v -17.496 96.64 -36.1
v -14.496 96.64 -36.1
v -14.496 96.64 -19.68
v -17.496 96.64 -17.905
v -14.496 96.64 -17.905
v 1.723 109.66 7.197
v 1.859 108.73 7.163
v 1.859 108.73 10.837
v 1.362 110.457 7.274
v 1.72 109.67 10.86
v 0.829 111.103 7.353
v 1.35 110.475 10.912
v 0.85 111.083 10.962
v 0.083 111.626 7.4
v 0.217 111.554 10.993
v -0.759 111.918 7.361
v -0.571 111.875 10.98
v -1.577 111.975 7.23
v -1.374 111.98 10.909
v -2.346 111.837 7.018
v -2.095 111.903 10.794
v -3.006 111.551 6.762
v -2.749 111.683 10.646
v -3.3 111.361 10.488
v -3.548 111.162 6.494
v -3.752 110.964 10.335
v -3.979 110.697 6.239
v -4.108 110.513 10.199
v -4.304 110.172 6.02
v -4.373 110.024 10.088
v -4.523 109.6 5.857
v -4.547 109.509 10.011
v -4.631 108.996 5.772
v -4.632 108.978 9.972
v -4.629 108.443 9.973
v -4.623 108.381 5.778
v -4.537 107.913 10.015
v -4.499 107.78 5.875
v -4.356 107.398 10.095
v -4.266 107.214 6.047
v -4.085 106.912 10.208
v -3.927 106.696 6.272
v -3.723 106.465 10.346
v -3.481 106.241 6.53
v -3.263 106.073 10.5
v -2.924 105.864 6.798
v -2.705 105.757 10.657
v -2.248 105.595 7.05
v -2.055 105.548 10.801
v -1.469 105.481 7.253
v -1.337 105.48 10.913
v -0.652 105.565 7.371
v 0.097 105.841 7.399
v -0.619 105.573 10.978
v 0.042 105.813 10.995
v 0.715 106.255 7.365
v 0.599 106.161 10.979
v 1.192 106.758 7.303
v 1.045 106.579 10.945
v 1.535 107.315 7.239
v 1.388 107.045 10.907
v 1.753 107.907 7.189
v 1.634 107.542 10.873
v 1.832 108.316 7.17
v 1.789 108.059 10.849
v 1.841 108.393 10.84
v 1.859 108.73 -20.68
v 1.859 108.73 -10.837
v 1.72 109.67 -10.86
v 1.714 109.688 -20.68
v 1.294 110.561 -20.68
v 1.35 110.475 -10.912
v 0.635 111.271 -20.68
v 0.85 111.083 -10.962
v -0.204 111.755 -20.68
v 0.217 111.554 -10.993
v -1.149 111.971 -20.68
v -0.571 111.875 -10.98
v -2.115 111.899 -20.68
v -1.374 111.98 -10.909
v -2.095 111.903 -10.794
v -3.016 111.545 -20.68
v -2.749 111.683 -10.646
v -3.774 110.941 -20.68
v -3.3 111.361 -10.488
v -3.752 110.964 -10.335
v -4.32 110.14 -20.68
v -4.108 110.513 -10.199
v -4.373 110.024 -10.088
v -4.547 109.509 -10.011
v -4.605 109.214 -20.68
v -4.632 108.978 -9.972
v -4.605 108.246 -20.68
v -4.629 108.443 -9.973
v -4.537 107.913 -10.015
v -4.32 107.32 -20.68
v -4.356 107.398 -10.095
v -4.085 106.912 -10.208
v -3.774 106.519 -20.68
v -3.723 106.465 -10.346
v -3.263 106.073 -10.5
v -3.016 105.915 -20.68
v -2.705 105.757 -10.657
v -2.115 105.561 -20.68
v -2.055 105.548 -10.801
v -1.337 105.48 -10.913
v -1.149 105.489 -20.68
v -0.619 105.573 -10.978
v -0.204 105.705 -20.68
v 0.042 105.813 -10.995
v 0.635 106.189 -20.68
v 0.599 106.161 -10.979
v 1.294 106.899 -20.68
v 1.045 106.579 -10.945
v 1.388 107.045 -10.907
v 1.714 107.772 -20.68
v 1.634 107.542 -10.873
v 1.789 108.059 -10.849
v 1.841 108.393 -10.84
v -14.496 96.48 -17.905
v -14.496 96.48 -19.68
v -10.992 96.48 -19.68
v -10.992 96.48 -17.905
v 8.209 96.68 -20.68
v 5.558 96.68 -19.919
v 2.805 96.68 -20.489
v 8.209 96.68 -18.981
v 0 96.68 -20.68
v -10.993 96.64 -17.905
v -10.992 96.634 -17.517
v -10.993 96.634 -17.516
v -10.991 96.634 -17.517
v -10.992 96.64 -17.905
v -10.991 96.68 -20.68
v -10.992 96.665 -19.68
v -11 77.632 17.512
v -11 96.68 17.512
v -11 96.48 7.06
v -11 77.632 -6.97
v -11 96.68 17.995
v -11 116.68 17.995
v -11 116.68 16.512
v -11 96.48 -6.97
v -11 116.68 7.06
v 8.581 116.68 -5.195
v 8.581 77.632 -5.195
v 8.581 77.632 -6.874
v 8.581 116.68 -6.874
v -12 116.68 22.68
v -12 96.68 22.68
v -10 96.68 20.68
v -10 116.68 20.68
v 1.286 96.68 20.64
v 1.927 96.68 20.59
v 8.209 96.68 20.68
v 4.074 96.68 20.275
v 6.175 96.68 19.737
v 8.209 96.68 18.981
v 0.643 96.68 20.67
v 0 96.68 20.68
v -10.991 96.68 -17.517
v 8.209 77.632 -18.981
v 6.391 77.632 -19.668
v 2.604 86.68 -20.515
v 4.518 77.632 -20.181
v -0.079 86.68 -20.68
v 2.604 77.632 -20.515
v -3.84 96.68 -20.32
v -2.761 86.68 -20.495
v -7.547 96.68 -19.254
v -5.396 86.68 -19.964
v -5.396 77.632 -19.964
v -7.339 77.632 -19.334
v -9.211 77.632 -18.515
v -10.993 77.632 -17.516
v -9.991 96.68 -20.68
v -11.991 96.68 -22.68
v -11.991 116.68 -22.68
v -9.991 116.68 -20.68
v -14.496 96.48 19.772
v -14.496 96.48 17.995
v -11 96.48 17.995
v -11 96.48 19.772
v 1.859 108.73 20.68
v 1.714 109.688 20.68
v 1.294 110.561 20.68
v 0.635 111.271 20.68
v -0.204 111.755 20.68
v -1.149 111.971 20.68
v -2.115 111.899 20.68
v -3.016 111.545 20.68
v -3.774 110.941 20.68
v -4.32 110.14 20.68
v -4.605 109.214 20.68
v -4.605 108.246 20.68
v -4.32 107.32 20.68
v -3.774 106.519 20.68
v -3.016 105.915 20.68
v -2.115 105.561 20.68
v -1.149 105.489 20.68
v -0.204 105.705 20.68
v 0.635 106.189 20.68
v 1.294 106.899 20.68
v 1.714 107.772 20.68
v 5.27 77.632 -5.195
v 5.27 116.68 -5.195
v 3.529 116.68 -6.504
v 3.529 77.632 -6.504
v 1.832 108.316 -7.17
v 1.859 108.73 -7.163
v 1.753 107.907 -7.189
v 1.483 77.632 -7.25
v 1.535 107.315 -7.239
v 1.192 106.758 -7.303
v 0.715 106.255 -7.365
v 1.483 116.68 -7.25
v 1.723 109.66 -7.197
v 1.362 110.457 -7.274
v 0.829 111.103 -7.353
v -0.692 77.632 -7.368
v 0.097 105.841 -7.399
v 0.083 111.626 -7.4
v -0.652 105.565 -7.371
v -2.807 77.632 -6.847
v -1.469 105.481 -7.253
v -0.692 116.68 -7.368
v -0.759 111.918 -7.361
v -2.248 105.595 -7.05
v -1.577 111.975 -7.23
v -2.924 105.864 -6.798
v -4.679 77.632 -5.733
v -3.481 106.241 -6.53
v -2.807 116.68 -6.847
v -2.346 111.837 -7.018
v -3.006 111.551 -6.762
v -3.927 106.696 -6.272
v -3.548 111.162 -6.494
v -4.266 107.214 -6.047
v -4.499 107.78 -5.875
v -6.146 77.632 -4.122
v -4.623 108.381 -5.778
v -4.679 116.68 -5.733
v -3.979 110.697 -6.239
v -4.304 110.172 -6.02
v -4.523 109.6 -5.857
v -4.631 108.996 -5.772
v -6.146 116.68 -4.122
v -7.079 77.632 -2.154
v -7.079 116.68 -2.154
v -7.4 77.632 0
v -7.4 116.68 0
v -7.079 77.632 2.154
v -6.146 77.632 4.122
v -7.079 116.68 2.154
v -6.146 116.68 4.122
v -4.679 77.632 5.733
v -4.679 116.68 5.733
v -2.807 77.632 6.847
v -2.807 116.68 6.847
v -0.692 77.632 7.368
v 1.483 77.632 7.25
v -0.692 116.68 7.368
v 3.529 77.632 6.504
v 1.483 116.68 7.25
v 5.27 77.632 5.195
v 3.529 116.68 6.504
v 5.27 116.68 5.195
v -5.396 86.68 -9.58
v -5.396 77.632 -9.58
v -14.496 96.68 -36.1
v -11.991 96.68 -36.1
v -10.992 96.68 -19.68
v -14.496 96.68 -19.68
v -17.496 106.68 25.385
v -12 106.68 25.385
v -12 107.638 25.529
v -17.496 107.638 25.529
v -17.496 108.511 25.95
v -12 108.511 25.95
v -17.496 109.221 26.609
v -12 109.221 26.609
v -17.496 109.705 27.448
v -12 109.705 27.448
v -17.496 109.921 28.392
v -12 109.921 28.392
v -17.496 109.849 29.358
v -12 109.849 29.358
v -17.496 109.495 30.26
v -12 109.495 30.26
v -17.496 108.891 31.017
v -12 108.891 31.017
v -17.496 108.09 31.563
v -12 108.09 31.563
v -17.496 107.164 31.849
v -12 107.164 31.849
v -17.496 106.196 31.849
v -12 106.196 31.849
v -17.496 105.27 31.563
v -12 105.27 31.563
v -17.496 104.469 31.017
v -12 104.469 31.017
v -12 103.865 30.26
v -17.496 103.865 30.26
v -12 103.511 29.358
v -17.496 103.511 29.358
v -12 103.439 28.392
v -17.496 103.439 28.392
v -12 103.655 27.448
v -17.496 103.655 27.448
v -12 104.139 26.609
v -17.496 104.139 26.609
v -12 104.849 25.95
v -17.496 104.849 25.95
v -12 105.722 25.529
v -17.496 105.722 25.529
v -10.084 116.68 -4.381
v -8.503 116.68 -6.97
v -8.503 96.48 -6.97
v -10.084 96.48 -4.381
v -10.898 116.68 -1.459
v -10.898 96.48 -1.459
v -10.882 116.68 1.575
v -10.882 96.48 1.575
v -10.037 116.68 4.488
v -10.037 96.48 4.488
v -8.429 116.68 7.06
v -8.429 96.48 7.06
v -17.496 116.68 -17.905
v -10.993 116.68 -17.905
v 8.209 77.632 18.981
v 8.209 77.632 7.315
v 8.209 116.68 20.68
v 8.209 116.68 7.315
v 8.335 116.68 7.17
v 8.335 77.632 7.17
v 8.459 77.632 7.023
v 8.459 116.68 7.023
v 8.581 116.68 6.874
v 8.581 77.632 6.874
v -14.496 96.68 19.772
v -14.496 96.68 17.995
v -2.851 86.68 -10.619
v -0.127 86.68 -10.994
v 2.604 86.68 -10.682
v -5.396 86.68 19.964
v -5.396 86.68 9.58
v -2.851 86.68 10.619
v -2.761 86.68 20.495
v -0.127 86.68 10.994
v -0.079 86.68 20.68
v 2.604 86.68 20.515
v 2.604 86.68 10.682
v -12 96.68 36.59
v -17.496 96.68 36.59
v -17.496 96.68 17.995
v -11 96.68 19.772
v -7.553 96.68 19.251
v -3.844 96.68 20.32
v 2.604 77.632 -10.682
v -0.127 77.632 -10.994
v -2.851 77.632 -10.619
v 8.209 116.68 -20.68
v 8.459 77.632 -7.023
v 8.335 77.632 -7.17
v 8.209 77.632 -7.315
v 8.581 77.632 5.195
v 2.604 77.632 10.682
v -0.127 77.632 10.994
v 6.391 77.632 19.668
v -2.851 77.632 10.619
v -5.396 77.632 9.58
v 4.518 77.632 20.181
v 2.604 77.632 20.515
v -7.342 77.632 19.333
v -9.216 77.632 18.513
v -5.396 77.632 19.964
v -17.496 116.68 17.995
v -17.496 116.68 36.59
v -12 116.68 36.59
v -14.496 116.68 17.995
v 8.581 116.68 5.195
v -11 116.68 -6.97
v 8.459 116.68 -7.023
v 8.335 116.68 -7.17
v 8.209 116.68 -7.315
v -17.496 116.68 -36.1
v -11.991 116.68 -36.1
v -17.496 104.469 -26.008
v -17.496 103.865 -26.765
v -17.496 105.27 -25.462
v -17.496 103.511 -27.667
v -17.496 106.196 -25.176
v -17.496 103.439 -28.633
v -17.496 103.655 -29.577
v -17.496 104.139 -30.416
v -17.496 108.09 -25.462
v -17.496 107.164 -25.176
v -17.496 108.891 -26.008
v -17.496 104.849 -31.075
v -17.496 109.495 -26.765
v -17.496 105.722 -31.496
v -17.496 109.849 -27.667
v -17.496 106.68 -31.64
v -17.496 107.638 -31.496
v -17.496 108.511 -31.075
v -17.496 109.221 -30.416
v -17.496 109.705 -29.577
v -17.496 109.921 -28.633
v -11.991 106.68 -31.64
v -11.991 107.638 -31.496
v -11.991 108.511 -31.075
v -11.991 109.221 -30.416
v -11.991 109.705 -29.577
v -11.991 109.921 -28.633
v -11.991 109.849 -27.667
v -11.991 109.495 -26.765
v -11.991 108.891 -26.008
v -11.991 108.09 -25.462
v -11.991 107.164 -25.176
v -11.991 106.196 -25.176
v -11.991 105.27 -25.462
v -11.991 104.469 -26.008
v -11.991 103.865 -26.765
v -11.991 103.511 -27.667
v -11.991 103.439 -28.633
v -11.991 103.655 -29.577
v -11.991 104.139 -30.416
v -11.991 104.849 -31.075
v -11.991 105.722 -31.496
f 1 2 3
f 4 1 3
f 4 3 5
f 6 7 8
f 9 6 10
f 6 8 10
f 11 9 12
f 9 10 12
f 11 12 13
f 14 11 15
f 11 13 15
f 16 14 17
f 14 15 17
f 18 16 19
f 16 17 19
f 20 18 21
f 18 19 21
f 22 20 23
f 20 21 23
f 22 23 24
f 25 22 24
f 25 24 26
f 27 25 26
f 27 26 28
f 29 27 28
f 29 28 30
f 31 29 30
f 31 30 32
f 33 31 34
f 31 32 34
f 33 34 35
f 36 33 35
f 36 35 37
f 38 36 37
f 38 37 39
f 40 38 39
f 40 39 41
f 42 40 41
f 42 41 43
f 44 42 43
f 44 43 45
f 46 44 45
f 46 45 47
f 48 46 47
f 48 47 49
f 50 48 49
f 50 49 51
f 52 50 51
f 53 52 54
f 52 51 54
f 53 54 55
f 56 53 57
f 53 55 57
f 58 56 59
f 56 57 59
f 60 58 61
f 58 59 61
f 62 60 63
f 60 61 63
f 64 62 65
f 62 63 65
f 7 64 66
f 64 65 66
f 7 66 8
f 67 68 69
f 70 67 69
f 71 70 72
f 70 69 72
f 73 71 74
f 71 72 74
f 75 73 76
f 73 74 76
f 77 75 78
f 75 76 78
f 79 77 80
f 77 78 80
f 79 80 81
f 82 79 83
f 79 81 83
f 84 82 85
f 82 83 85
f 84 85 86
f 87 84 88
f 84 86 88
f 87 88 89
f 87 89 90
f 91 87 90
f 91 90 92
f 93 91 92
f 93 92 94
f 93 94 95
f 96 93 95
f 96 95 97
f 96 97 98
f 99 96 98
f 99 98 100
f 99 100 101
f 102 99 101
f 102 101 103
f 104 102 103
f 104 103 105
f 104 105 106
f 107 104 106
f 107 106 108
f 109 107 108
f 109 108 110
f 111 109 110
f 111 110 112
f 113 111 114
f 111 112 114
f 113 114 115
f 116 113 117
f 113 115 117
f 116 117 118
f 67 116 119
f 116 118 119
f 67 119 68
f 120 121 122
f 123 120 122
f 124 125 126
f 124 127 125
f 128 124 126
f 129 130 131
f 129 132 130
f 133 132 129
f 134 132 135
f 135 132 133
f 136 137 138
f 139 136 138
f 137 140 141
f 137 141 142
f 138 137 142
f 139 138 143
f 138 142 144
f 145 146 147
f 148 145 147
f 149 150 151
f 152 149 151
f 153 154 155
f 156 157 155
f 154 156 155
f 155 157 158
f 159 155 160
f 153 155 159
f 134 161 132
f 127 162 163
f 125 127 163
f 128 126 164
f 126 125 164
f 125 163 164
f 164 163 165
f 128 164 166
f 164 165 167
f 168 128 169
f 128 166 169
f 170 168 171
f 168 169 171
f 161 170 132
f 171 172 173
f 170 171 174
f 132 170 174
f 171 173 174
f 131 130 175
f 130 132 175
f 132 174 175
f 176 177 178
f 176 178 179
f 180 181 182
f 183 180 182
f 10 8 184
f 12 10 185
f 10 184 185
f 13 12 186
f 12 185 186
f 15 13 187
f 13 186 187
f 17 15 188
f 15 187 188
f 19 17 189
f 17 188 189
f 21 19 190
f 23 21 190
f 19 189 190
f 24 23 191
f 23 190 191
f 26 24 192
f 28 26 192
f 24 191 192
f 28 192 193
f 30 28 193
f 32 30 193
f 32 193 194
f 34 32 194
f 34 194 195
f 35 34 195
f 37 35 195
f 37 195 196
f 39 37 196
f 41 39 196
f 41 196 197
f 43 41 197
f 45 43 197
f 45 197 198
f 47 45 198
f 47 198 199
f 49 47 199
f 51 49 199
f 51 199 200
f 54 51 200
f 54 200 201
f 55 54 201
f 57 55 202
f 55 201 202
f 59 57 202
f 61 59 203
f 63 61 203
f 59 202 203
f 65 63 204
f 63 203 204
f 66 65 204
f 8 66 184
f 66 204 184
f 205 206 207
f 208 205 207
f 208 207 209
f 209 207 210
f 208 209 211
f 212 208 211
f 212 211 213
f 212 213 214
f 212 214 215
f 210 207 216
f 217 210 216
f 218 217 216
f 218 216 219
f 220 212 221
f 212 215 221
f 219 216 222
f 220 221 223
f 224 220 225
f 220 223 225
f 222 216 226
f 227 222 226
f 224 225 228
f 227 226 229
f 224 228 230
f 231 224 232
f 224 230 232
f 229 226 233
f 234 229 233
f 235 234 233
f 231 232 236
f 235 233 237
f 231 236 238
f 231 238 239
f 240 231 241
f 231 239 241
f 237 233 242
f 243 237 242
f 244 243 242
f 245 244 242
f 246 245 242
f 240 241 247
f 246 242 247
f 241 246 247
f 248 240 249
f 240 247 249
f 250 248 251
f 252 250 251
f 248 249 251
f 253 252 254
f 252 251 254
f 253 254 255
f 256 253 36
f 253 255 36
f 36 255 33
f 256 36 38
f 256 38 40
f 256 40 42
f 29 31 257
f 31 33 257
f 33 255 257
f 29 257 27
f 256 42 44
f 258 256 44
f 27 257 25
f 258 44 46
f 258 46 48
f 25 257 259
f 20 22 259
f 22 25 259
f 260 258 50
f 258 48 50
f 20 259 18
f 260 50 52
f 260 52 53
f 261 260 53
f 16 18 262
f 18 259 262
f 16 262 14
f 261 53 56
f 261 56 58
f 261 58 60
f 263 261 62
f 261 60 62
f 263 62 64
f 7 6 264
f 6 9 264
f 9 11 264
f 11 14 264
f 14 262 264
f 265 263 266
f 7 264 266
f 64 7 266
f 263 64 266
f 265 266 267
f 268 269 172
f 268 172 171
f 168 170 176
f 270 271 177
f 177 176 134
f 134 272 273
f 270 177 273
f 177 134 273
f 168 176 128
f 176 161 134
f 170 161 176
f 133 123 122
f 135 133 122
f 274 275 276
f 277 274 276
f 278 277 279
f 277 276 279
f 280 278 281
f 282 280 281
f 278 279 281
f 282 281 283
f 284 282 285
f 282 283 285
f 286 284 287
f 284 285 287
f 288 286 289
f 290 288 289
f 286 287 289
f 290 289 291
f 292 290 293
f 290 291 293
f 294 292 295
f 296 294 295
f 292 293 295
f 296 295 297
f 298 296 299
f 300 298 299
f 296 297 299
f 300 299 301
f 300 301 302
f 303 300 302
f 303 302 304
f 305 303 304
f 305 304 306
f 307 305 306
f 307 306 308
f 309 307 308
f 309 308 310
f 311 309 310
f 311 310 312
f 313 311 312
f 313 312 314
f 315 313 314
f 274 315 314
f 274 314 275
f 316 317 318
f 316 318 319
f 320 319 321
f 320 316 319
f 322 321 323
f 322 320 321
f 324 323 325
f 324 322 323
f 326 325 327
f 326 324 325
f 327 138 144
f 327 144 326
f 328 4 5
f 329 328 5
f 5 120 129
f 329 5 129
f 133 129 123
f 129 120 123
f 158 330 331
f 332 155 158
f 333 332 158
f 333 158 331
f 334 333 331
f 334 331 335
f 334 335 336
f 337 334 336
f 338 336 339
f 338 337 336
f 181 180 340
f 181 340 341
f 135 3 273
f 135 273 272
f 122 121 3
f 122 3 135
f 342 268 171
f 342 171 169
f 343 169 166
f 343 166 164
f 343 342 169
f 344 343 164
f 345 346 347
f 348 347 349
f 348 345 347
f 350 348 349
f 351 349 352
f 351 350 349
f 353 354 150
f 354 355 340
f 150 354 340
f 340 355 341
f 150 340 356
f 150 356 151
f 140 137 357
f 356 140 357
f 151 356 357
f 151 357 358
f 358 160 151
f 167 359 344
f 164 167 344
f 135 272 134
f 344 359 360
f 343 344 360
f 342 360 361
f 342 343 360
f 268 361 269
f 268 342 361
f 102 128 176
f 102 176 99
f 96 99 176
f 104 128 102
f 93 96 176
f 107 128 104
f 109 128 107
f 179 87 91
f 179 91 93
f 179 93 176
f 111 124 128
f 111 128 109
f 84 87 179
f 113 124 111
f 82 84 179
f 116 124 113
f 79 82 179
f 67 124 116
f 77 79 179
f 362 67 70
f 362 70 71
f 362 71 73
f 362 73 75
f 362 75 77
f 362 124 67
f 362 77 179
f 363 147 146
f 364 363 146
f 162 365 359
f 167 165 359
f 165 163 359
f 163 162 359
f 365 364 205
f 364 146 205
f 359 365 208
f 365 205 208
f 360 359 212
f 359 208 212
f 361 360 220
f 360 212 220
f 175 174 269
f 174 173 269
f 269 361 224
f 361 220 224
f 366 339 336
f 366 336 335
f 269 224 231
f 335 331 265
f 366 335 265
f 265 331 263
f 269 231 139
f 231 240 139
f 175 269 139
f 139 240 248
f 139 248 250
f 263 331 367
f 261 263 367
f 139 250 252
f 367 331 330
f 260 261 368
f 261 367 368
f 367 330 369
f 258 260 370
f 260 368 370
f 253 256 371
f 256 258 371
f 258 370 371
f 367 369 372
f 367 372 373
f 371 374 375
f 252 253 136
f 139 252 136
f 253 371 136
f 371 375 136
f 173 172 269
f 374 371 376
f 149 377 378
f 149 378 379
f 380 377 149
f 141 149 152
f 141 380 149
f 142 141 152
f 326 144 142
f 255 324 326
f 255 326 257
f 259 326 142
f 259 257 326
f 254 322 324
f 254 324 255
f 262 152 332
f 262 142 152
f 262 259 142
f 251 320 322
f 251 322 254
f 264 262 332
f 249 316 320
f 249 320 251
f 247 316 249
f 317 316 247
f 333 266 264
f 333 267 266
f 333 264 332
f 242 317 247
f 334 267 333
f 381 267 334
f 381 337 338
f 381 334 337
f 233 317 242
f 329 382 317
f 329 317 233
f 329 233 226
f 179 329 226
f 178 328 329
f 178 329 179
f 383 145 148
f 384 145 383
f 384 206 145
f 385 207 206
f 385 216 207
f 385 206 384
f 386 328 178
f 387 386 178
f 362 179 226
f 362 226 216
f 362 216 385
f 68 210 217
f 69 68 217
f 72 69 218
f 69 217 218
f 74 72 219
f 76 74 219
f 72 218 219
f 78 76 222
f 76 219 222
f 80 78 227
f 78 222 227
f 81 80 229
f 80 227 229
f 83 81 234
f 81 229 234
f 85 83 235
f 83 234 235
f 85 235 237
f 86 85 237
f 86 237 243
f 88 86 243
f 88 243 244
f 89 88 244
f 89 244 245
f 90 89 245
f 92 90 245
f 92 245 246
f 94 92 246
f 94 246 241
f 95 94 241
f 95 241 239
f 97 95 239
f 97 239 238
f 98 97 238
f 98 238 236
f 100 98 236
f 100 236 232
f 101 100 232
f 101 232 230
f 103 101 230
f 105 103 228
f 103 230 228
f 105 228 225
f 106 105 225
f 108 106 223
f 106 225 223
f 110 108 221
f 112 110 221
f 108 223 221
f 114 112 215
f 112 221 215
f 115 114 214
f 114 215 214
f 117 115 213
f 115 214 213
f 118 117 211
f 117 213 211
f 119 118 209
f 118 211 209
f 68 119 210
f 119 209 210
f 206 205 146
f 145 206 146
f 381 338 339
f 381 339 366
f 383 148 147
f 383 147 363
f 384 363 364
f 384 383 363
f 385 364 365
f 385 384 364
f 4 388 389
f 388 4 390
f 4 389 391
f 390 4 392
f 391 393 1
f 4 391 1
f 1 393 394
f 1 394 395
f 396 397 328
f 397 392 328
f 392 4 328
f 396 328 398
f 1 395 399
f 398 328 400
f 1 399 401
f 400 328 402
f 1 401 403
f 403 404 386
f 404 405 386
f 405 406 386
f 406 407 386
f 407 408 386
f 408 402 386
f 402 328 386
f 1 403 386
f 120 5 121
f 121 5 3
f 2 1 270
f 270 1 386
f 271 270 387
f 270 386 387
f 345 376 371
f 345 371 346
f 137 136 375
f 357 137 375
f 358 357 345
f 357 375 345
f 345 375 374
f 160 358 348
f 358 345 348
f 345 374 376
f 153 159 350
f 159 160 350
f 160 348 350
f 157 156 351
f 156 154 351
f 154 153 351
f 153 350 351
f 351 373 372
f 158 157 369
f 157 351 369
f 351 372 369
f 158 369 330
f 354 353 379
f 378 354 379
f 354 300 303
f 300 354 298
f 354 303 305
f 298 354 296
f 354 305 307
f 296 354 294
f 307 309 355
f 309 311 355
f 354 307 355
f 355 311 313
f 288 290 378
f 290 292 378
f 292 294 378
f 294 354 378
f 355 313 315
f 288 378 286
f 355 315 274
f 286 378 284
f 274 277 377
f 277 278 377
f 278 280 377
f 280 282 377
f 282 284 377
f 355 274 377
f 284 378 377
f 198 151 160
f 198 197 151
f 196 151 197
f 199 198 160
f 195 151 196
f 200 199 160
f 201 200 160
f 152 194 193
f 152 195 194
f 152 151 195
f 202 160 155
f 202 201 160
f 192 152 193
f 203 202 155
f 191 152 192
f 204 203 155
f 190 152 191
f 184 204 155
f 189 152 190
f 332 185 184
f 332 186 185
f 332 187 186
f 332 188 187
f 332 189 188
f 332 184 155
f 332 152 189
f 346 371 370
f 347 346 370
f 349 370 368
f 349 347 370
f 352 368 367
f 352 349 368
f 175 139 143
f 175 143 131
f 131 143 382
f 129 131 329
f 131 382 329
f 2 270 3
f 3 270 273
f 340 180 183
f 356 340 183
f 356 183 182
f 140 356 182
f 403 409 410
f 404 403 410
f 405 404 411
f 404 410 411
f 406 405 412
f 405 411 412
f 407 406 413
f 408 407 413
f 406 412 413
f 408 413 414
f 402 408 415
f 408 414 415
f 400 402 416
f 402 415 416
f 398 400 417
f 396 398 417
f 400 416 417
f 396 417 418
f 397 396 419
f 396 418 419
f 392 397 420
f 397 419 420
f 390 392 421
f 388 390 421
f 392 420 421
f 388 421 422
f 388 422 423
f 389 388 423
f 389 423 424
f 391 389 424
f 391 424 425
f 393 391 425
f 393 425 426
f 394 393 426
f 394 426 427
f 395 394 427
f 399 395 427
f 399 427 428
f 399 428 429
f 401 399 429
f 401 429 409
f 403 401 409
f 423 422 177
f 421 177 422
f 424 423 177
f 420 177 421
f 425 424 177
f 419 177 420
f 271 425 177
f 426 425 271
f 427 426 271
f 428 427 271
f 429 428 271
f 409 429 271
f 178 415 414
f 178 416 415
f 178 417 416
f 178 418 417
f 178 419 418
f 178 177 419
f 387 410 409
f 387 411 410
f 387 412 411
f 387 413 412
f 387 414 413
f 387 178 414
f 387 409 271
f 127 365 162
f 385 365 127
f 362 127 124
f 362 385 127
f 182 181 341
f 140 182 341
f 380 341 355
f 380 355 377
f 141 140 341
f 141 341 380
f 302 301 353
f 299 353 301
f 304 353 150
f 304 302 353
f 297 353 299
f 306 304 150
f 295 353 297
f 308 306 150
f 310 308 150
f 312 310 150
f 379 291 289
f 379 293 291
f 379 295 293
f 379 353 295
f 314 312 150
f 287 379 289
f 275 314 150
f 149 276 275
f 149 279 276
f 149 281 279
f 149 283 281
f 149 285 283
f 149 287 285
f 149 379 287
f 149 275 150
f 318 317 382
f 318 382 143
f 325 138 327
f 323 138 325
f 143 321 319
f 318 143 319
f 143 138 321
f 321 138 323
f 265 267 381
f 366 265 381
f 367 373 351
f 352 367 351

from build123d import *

# Parameters (mm, degrees)
SKETCH_1_R                = 20.68
SKETCH_1_R_2              = 9.68
EXTRUDE_1_DEPTH           = 116.68
SKETCH_11_W               = 27
SKETCH_11_H               = 150
CUT_EXTRUDE_3_DEPTH       = 40
SKETCH_13_W               = 10
SKETCH_13_H               = 128.345013401
CUT_EXTRUDE_7_DEPTH       = 42.68
SKETCH_15_W               = 8
SKETCH_15_H               = 68.68
CUT_EXTRUDE_9_DEPTH       = 48
SKETCH_16_W               = 15.549431524
SKETCH_16_H               = 20
SKETCH_16_W_2             = 15.459431524
EXTRUDE_4_DEPTH           = 19.2
SKETCH_17_W               = 19.20851187
SKETCH_17_H               = 14.03
CUT_EXTRUDE_10_DEPTH      = 20.2
SKETCH_18_R               = 9.59
CUT_EXTRUDE_11_DEPTH      = 117.68
SKETCH_21_R               = 2.985
CUT_EXTRUDE_12_DEPTH      = 55.2
SKETCH_24_R               = 20.59
SKETCH_24_R_2             = 9.59
EXTRUDE_2_DEPTH           = 55.2
CUT_EXTRUDE_13_DEPTH      = 55.2
SKETCH_26_W               = 10.00851187
SKETCH_26_H               = 41.68
CUT_EXTRUDE_15_DEPTH      = 55.2
SKETCH_27_W               = 10
SKETCH_27_H               = 40
CUT_EXTRUDE_16_DEPTH      = 55.2
SKETCH_28_W               = 44.880694938
SKETCH_28_H               = 9.608044066
CUT_EXTRUDE_17_DEPTH      = 12.2
SKETCH_35_W               = 13.53
SKETCH_35_H               = 20
EXTRUDE_10_DEPTH          = 15
EXTRUDE_11_DEPTH          = 15
SKETCH_37_W               = 9
SKETCH_37_H               = 20
EXTRUDE_12_DEPTH          = 20
SKETCH_38_W               = 9
SKETCH_38_H               = 20
EXTRUDE_13_DEPTH          = 20
SKETCH_42_R               = 2.985
CUT_EXTRUDE_21_DEPTH      = 20
CUT_EXTRUDE_23_DEPTH      = 129.465
SKETCH_45_W               = 3
SKETCH_45_H               = 20
EXTRUDE_14_DEPTH          = 30
SKETCH_46_W               = 3
SKETCH_46_H               = 20
EXTRUDE_15_DEPTH          = 30
SKETCH_47_W               = 33.078221107
SKETCH_47_H               = 20
EXTRUDE_16_DEPTH          = 50
SKETCH_48_W               = 30
SKETCH_48_H               = 20
EXTRUDE_17_DEPTH          = 50
SKETCH_50_W               = 50
SKETCH_50_H               = 20
EXTRUDE_18_DEPTH          = 1
SKETCH_51_W               = 50
SKETCH_51_H               = 20
EXTRUDE_19_DEPTH          = 1
SKETCH_52_W               = 53
SKETCH_52_H               = 14
CUT_EXTRUDE_24_DEPTH      = 129.465
SKETCH_53_W               = 53
SKETCH_53_H               = 14
CUT_EXTRUDE_25_DEPTH      = 129.465
SKETCH_54_W               = 40
SKETCH_54_H               = 73.27
CUT_EXTRUDE_26_DEPTH      = 129.465
SKETCH_56_W               = 13.00851187
SKETCH_56_H               = 20
EXTRUDE_21_DEPTH          = 3.08
SKETCH_58_W               = 44.672014854
SKETCH_58_H               = 95.939897673
CUT_EXTRUDE_28_DEPTH      = 90.76
SKETCH_59_R               = 9.7
CUT_EXTRUDE_29_DEPTH      = 40.048276961
SKETCH_60_W               = 6.504255935
SKETCH_60_H               = 76.35
CUT_EXTRUDE_30_DEPTH      = 40.048276961
CUT_EXTRUDE_32_DEPTH      = 20
SKETCH_64_W               = 16.20851187
SKETCH_64_H               = 0.09
EXTRUDE_22_DEPTH          = 20
SKETCH_65_W               = 3.495744065
SKETCH_65_H               = 3.26
CUT_EXTRUDE_33_DEPTH      = 40.048276961
SKETCH_66_W               = 3.495744065
SKETCH_66_H               = 1.776778893
SKETCH_66_W_2             = 3.503635083
SKETCH_66_H_2             = 1.775
EXTRUDE_23_DEPTH          = 20.2
SKETCH_68_W               = 6.504255935
SKETCH_68_H               = 3.66
CUT_EXTRUDE_34_DEPTH      = 20
SKETCH_69_R               = 2.985
CUT_EXTRUDE_35_DEPTH      = 7.504255935
SKETCH_70_R               = 2.985
CUT_EXTRUDE_36_DEPTH      = 17
SKETCH_71_W               = 18.595
SKETCH_71_H               = 20
SKETCH_71_W_2             = 18.195
SKETCH_71_H_2             = 20.0404814
EXTRUDE_24_DEPTH          = 10
SKETCH_72_R               = 3.05
CUT_EXTRUDE_37_DEPTH      = 17.495744065
SKETCH_73_W               = 4
SKETCH_73_H               = 15.42
CUT_EXTRUDE_39_DEPTH      = 40.048276961
SKETCH_74_W               = 4
SKETCH_74_H               = 15.91
CUT_EXTRUDE_40_DEPTH      = 40.048276961
EXTRUDE_25_DEPTH          = 20
SKETCH_77_W               = 7
SKETCH_77_H               = 72.69
CUT_EXTRUDE_41_DEPTH      = 40.048276961
SKETCH_78_R               = 3.25
CUT_EXTRUDE_42_DEPTH      = 87.1
SKETCH_79_R               = 3.25
CUT_EXTRUDE_43_DEPTH      = 10
CUT_EXTRUDE_43_DEPTH_BACK = 10
SKETCH_80_R               = 10.995
SKETCH_80_R_2             = 6.995
EXTRUDE_3_DEPTH           = 40
CUT_EXTRUDE_44_DEPTH      = 87.1
SKETCH_82_W               = 11.494274306
SKETCH_82_H               = 10.39
CUT_EXTRUDE_45_DEPTH      = 43
SKETCH_83_R               = 3.25
CUT_EXTRUDE_46_DEPTH      = 78
SKETCH_84_W               = 4.108929189
SKETCH_84_H               = 16.904278856
CUT_EXTRUDE_47_DEPTH      = 46
SKETCH_85_R               = 7.4
CUT_EXTRUDE_48_DEPTH      = 40.048276961


with BuildPart() as part:
    # 草圖1 → 伸長-薄件1 (new body)
    with BuildSketch(Plane(origin=(0, 0, 0), x_dir=(1, 0, 0), z_dir=(0, 1, 0))):
        Circle(SKETCH_1_R)
        Circle(SKETCH_1_R_2, mode=Mode.SUBTRACT)
    extrude(amount=EXTRUDE_1_DEPTH)

    # 草圖11 → 除料-伸長3 (cut)
    with BuildSketch(Plane(origin=(0, 116.68, 0), x_dir=(1, 0, 0), z_dir=(0, 1, 0))):
        with Locations((21.70851187, -44.235815192)):
            Rectangle(SKETCH_11_W, SKETCH_11_H)
    extrude(amount=-CUT_EXTRUDE_3_DEPTH, mode=Mode.SUBTRACT)

    # 草圖13 → 除料-伸長7 (cut, through all)
    with BuildSketch(Plane.XY.offset(21)):
        with Locations((-16, 58.612182466)):
            Rectangle(SKETCH_13_W, SKETCH_13_H)
    extrude(amount=-CUT_EXTRUDE_7_DEPTH, mode=Mode.SUBTRACT)

    # 草圖15 → 除料-伸長9 (cut)
    with BuildSketch(Plane.XY.offset(21)):
        with Locations((-1.395744065, 52.34)):
            Rectangle(SKETCH_15_W, SKETCH_15_H)
    extrude(amount=-CUT_EXTRUDE_9_DEPTH, mode=Mode.SUBTRACT)

    # 草圖16 → 填料-伸長4 (add)
    with BuildSketch(Plane(origin=(8.20851187, 0, 0), x_dir=(0, 0, -1), z_dir=(1, 0, 0))):
        with Locations((12.905284238, 106.68)):
            Rectangle(SKETCH_16_W, SKETCH_16_H)
        with Locations((-12.860284238, 106.68)):
            Rectangle(SKETCH_16_W_2, SKETCH_16_H)
    extrude(amount=-EXTRUDE_4_DEPTH)

    # 草圖17 → 除料-伸長10 (cut)
    with BuildSketch(Plane(origin=(0, 116.68, 0), x_dir=(1, 0, 0), z_dir=(0, 1, 0))):
        with Locations((-1.395744065, -0.045)):
            Rectangle(SKETCH_17_W, SKETCH_17_H)
    extrude(amount=-CUT_EXTRUDE_10_DEPTH, mode=Mode.SUBTRACT)

    # 草圖18 → 除料-伸長11 (cut, through all)
    with BuildSketch(Plane.XZ):
        Circle(SKETCH_18_R)
    extrude(amount=-CUT_EXTRUDE_11_DEPTH, mode=Mode.SUBTRACT)

    # 草圖21 → 除料-伸長12 (cut)
    with BuildSketch(Plane(origin=(0, 0, -20.68), x_dir=(-1, 0, 0), z_dir=(0, 0, -1))):
        with Locations((1.39148813, 108.73)):
            Circle(SKETCH_21_R)
    extrude(amount=-CUT_EXTRUDE_12_DEPTH, mode=Mode.SUBTRACT)

    # 草圖24 → 伸長-薄件2 (add)
    with BuildSketch(Plane.XZ):
        Circle(SKETCH_24_R)
        Circle(SKETCH_24_R_2, mode=Mode.SUBTRACT)
    extrude(amount=EXTRUDE_2_DEPTH)

    # 草圖25 → 除料-伸長13 (cut)
    with BuildSketch(Plane.XY.offset(21)):
        Polygon((-1.39148813, -11.785), (22.612379708, -11.785), (22.612379708, -63.873337429), (-22.749525245, -63.873337429), (-22.749525245, -11.785), align=None)
    extrude(amount=-CUT_EXTRUDE_13_DEPTH, mode=Mode.SUBTRACT)

    # 草圖26 → 除料-伸長15 (cut)
    with BuildSketch(Plane(origin=(0, 0, 0), x_dir=(1, 0, 0), z_dir=(0, 1, 0))):
        with Locations((-15.995744065, -0.16)):
            Rectangle(SKETCH_26_W, SKETCH_26_H)
    extrude(amount=-CUT_EXTRUDE_15_DEPTH, mode=Mode.SUBTRACT)

    # 草圖27 → 除料-伸長16 (cut)
    with BuildSketch(Plane(origin=(21, 0, 0), x_dir=(0, 0, -1), z_dir=(1, 0, 0))):
        with Locations((0, 41.68)):
            Rectangle(SKETCH_27_W, SKETCH_27_H)
    extrude(amount=-CUT_EXTRUDE_16_DEPTH, mode=Mode.SUBTRACT)

    # 草圖28 → 除料-伸長17 (cut)
    with BuildSketch(Plane(origin=(21, 0, 0), x_dir=(0, 0, -1), z_dir=(1, 0, 0))):
        Rectangle(SKETCH_28_W, SKETCH_28_H)
    extrude(amount=-CUT_EXTRUDE_17_DEPTH, mode=Mode.SUBTRACT)

    # 草圖35 → 填料-伸長10 (add)
    with BuildSketch(Plane.ZY.offset(10.99148813)):
        with Locations((13.825, 106.68)):
            Rectangle(SKETCH_35_W, SKETCH_35_H)
    extrude(amount=EXTRUDE_10_DEPTH)

    # 草圖36 → 填料-伸長11 (add)
    with BuildSketch(Plane.ZY.offset(10.99148813)):
        Polygon((-20.68, 116.68), (-6.97, 116.68), (-6.97, 96.48), (-20.68, 96.68), align=None)
    extrude(amount=EXTRUDE_11_DEPTH)

    # 草圖37 → 填料-伸長12 (add)
    with BuildSketch(Plane.XY.offset(20.59)):
        with Locations((-21.49148813, 106.68)):
            Rectangle(SKETCH_37_W, SKETCH_37_H)
    extrude(amount=EXTRUDE_12_DEPTH)

    # 草圖38 → 填料-伸長13 (add)
    with BuildSketch(Plane(origin=(0, 0, -20.68), x_dir=(-1, 0, 0), z_dir=(0, 0, -1))):
        with Locations((21.49148813, 106.68)):
            Rectangle(SKETCH_38_W, SKETCH_38_H)
    extrude(amount=EXTRUDE_13_DEPTH)

    # 草圖42 → 除料-伸長21 (cut)
    with BuildSketch(Plane(origin=(-16.99148813, 0, 0), x_dir=(0, 0, -1), z_dir=(1, 0, 0))):
        with Locations((30.68, 106.554418142)):
            Circle(SKETCH_42_R)
        with Locations((-30.395640125, 106.68)):
            Circle(SKETCH_42_R)
    extrude(amount=-CUT_EXTRUDE_21_DEPTH, mode=Mode.SUBTRACT)

    # 草圖43 → 除料-伸長23 (cut, through all)
    with BuildSketch(Plane(origin=(0, 116.68, 0), x_dir=(1, 0, 0), z_dir=(0, 1, 0))):
        Polygon((-11, 6.97), (-10.99148813, 20.68), (-10.99148813, 48.096794253), (-28.274756234, 48.096794253), (-28.274756234, -43.270506289), (-11, -43.270506289), align=None)
    extrude(amount=-CUT_EXTRUDE_23_DEPTH, mode=Mode.SUBTRACT)

    # 草圖45 → 填料-伸長14 (add)
    with BuildSketch(Plane.XY.offset(20.59)):
        with Locations((-9.5, 106.68)):
            Rectangle(SKETCH_45_W, SKETCH_45_H)
    extrude(amount=EXTRUDE_14_DEPTH)

    # 草圖46 → 填料-伸長15 (add)
    with BuildSketch(Plane(origin=(0, 0, -20.68), x_dir=(-1, 0, 0), z_dir=(0, 0, -1))):
        with Locations((9.49148813, 106.68)):
            Rectangle(SKETCH_46_W, SKETCH_46_H)
    extrude(amount=EXTRUDE_15_DEPTH)

    # 草圖47 → 填料-伸長16 (add)
    with BuildSketch(Plane.ZY.offset(11)):
        with Locations((34.050889447, 106.68)):
            Rectangle(SKETCH_47_W, SKETCH_47_H)
    extrude(amount=EXTRUDE_16_DEPTH)

    # 草圖48 → 填料-伸長17 (add)
    with BuildSketch(Plane.ZY.offset(10.99148813)):
        with Locations((-35.68, 106.68)):
            Rectangle(SKETCH_48_W, SKETCH_48_H)
    extrude(amount=EXTRUDE_17_DEPTH)

    # 草圖50 → 填料-伸長18 (add)
    with BuildSketch(Plane(origin=(0, 0, 17.511778893), x_dir=(-1, 0, 0), z_dir=(0, 0, -1))):
        with Locations((36, 106.68)):
            Rectangle(SKETCH_50_W, SKETCH_50_H)
    extrude(amount=EXTRUDE_18_DEPTH)

    # 草圖51 → 填料-伸長19 (add)
    with BuildSketch(Plane.XY.offset(-20.68)):
        with Locations((-35.99148813, 106.68)):
            Rectangle(SKETCH_51_W, SKETCH_51_H)
    extrude(amount=EXTRUDE_19_DEPTH)

    # 草圖52 → 除料-伸長24 (cut, through all)
    with BuildSketch(Plane(origin=(0, 116.68, 0), x_dir=(1, 0, 0), z_dir=(0, 1, 0))):
        with Locations((-34.49148813, 43.68)):
            Rectangle(SKETCH_52_W, SKETCH_52_H)
    extrude(amount=-CUT_EXTRUDE_24_DEPTH, mode=Mode.SUBTRACT)

    # 草圖53 → 除料-伸長25 (cut, through all)
    with BuildSketch(Plane(origin=(0, 116.68, 0), x_dir=(1, 0, 0), z_dir=(0, 1, 0))):
        with Locations((-34.5, -43.59)):
            Rectangle(SKETCH_53_W, SKETCH_53_H)
    extrude(amount=-CUT_EXTRUDE_25_DEPTH, mode=Mode.SUBTRACT)

    # 草圖54 → 除料-伸長26 (cut, through all)
    with BuildSketch(Plane(origin=(0, 116.68, 0), x_dir=(1, 0, 0), z_dir=(0, 1, 0))):
        with Locations((-41, 0.045)):
            Rectangle(SKETCH_54_W, SKETCH_54_H)
    extrude(amount=-CUT_EXTRUDE_26_DEPTH, mode=Mode.SUBTRACT)

    # 草圖56 → 填料-伸長21 (add)
    with BuildSketch(Plane(origin=(0, 0, -36.68), x_dir=(-1, 0, 0), z_dir=(0, 0, -1))):
        with Locations((14.495744065, 106.68)):
            Rectangle(SKETCH_56_W, SKETCH_56_H)
    extrude(amount=EXTRUDE_21_DEPTH)

    # 草圖58 → 除料-伸長28 (cut, through all)
    with BuildSketch(Plane.XY.offset(50)):
        with Locations((-0.234953045, 29.661774302)):
            Rectangle(SKETCH_58_W, SKETCH_58_H)
    extrude(amount=-CUT_EXTRUDE_28_DEPTH, mode=Mode.SUBTRACT)

    # 草圖59 → 除料-伸長29 (cut, through all)
    with BuildSketch(Plane.XZ.offset(-77.631723139)):
        Circle(SKETCH_59_R)
    extrude(amount=-CUT_EXTRUDE_29_DEPTH, mode=Mode.SUBTRACT)

    # 草圖60 → 除料-伸長30 (cut, through all)
    with BuildSketch(Plane(origin=(0, 116.68, 0), x_dir=(1, 0, 0), z_dir=(0, 1, 0))):
        with Locations((-17.747872032, 1.585)):
            Rectangle(SKETCH_60_W, SKETCH_60_H)
    extrude(amount=-CUT_EXTRUDE_30_DEPTH, mode=Mode.SUBTRACT)

    # 草圖61 → 除料-伸長32 (cut)
    with BuildSketch(Plane(origin=(0, 116.68, 0), x_dir=(1, 0, 0), z_dir=(0, 1, 0))):
        Polygon((1.92725193, -20.59), (1.92725193, -22.399121663), (-2.174190472, -21.421542421), (-2.174190472, -20.59), align=None)
    extrude(amount=-CUT_EXTRUDE_32_DEPTH, mode=Mode.SUBTRACT)

    # 草圖64 → 填料-伸長22 (add)
    with BuildSketch(Plane(origin=(0, 116.68, 0), x_dir=(1, 0, 0), z_dir=(0, 1, 0))):
        with Locations((0.104255935, -20.635)):
            Rectangle(SKETCH_64_W, SKETCH_64_H)
    extrude(amount=-EXTRUDE_22_DEPTH)

    # 草圖65 → 除料-伸長33 (cut, through all)
    with BuildSketch(Plane(origin=(0, 116.68, 0), x_dir=(1, 0, 0), z_dir=(0, 1, 0))):
        with Locations((-12.747872033, -18.141778893)):
            Rectangle(SKETCH_65_W, SKETCH_65_H)
    extrude(amount=-CUT_EXTRUDE_33_DEPTH, mode=Mode.SUBTRACT)

    # 草圖66 → 填料-伸長23 (add)
    with BuildSketch(Plane(origin=(0, 96.48, 0), x_dir=(1, 0, 0), z_dir=(0, 1, 0))):
        with Locations((-12.747872033, -18.883389447)):
            Rectangle(SKETCH_66_W, SKETCH_66_H)
        with Locations((-12.743926524, 18.7925)):
            Rectangle(SKETCH_66_W_2, SKETCH_66_H_2)
    extrude(amount=EXTRUDE_23_DEPTH)

    # 草圖68 → 除料-伸長34 (cut)
    with BuildSketch(Plane(origin=(0, 116.68, 0), x_dir=(1, 0, 0), z_dir=(0, 1, 0))):
        with Locations((-11.243616098, 37.93)):
            Rectangle(SKETCH_68_W, SKETCH_68_H)
    extrude(amount=-CUT_EXTRUDE_34_DEPTH, mode=Mode.SUBTRACT)

    # 草圖69 → 除料-伸長35 (cut, through all)
    with BuildSketch(Plane(origin=(-7.99148813, 0, 0), x_dir=(0, 0, -1), z_dir=(1, 0, 0))):
        with Locations((28.39, 106.68)):
            Circle(SKETCH_69_R)
        with Locations((-28.635, 106.68)):
            Circle(SKETCH_69_R)
    extrude(amount=-CUT_EXTRUDE_35_DEPTH, mode=Mode.SUBTRACT)

    # 草圖70 → 除料-伸長36 (cut, through all)
    with BuildSketch(Plane(origin=(0, 0, 20.59), x_dir=(-1, 0, 0), z_dir=(0, 0, -1))):
        with Locations((1.39148813, 108.73)):
            Circle(SKETCH_70_R)
    extrude(amount=-CUT_EXTRUDE_36_DEPTH, mode=Mode.SUBTRACT)

    # 草圖71 → 填料-伸長24 (add)
    with BuildSketch(Plane.ZY.offset(14.495744065)):
        with Locations((27.2925, 106.68)):
            Rectangle(SKETCH_71_W, SKETCH_71_H)
        with Locations((-27.0025, 106.6597593)):
            Rectangle(SKETCH_71_W_2, SKETCH_71_H_2)
    extrude(amount=EXTRUDE_24_DEPTH)

    # 草圖72 → 除料-伸長37 (cut, through all)
    with BuildSketch(Plane(origin=(-8, 0, 0), x_dir=(0, 0, -1), z_dir=(1, 0, 0))):
        with Locations((-28.635, 106.68)):
            Circle(SKETCH_72_R)
        with Locations((28.39, 106.68)):
            Circle(SKETCH_72_R)
    extrude(amount=-CUT_EXTRUDE_37_DEPTH, mode=Mode.SUBTRACT)

    # 草圖73 → 除料-伸長39 (cut, through all)
    with BuildSketch(Plane(origin=(0, 116.68, 0), x_dir=(1, 0, 0), z_dir=(0, 1, 0))):
        with Locations((-9.99148813, 28.39)):
            Rectangle(SKETCH_73_W, SKETCH_73_H)
    extrude(amount=-CUT_EXTRUDE_39_DEPTH, mode=Mode.SUBTRACT)

    # 草圖74 → 除料-伸長40 (cut, through all)
    with BuildSketch(Plane(origin=(0, 116.68, 0), x_dir=(1, 0, 0), z_dir=(0, 1, 0))):
        with Locations((-10, -28.635)):
            Rectangle(SKETCH_74_W, SKETCH_74_H)
    extrude(amount=-CUT_EXTRUDE_40_DEPTH, mode=Mode.SUBTRACT)

    # 草圖75 → 填料-伸長25 (add)
    with BuildSketch(Plane(origin=(0, 116.68, 0), x_dir=(1, 0, 0), z_dir=(0, 1, 0))):
        Polygon((-12, -20.68), (-12, -22.68), (-10, -20.68), align=None)
        Polygon((-11.99148813, 20.68), (-11.99148813, 22.68), (-9.99148813, 20.68), align=None)
    extrude(amount=-EXTRUDE_25_DEPTH)

    # 草圖77 → 除料-伸長41 (cut, through all)
    with BuildSketch(Plane(origin=(0, 116.68, 0), x_dir=(1, 0, 0), z_dir=(0, 1, 0))):
        with Locations((-20.995744065, -0.245)):
            Rectangle(SKETCH_77_W, SKETCH_77_H)
    extrude(amount=-CUT_EXTRUDE_41_DEPTH, mode=Mode.SUBTRACT)

    # 草圖78 → 除料-伸長42 (cut, through all)
    with BuildSketch(Plane.XY.offset(50)):
        with Locations((-1.39148813, 108.73)):
            Circle(SKETCH_78_R)
    extrude(amount=-CUT_EXTRUDE_42_DEPTH, mode=Mode.SUBTRACT)

    # 草圖79 → 除料-伸長43 (cut, two sides)
    with BuildSketch(Plane(origin=(-11.99148813, 0, 0), x_dir=(0, 0, -1), z_dir=(1, 0, 0))) as cut_extrude_43_sk:
        with Locations((28.39, 106.68)):
            Circle(SKETCH_79_R)
        with Locations((-28.635, 106.68)):
            Circle(SKETCH_79_R)
    extrude(amount=CUT_EXTRUDE_43_DEPTH, mode=Mode.SUBTRACT)
    extrude(cut_extrude_43_sk.sketch, amount=-CUT_EXTRUDE_43_DEPTH_BACK, mode=Mode.SUBTRACT)

    # 草圖80 → 伸長-薄件3 (add)
    with BuildSketch(Plane(origin=(0, 116.68, 0), x_dir=(1, 0, 0), z_dir=(0, 1, 0))):
        Circle(SKETCH_80_R)
        Circle(SKETCH_80_R_2, mode=Mode.SUBTRACT)
    extrude(amount=-EXTRUDE_3_DEPTH)

    # 草圖81 → 除料-伸長44 (cut, through all)
    with BuildSketch(Plane.XY.offset(50)):
        Polygon((8.20851187, 77.631723139), (-11, 77.631723139), (-10.995, 76.68), (10.995, 76.68), (10.995, 77.631723139), align=None)
    extrude(amount=-CUT_EXTRUDE_44_DEPTH, mode=Mode.SUBTRACT)

    # 草圖82 → 除料-伸長45 (cut)
    with BuildSketch(Plane(origin=(0, 116.68, 0), x_dir=(1, 0, 0), z_dir=(0, 1, 0))):
        with Locations((6.995, 0)):
            Rectangle(SKETCH_82_W, SKETCH_82_H)
    extrude(amount=-CUT_EXTRUDE_45_DEPTH, mode=Mode.SUBTRACT)

    # 草圖83 → 除料-伸長46 (cut)
    with BuildSketch(Plane.XY.offset(50)):
        with Locations((-1.39148813, 108.73)):
            Circle(SKETCH_83_R)
    extrude(amount=-CUT_EXTRUDE_46_DEPTH, mode=Mode.SUBTRACT)

    # 草圖84 → 除料-伸長47 (cut)
    with BuildSketch(Plane(origin=(0, 116.68, 0), x_dir=(1, 0, 0), z_dir=(0, 1, 0))):
        with Locations((10.635588866, -0.211738477)):
            Rectangle(SKETCH_84_W, SKETCH_84_H)
    extrude(amount=-CUT_EXTRUDE_47_DEPTH, mode=Mode.SUBTRACT)

    # 草圖85 → 除料-伸長48 (cut, through all)
    with BuildSketch(Plane(origin=(0, 116.68, 0), x_dir=(1, 0, 0), z_dir=(0, 1, 0))):
        Circle(SKETCH_85_R)
    extrude(amount=-CUT_EXTRUDE_48_DEPTH, mode=Mode.SUBTRACT)


solid = part.part
